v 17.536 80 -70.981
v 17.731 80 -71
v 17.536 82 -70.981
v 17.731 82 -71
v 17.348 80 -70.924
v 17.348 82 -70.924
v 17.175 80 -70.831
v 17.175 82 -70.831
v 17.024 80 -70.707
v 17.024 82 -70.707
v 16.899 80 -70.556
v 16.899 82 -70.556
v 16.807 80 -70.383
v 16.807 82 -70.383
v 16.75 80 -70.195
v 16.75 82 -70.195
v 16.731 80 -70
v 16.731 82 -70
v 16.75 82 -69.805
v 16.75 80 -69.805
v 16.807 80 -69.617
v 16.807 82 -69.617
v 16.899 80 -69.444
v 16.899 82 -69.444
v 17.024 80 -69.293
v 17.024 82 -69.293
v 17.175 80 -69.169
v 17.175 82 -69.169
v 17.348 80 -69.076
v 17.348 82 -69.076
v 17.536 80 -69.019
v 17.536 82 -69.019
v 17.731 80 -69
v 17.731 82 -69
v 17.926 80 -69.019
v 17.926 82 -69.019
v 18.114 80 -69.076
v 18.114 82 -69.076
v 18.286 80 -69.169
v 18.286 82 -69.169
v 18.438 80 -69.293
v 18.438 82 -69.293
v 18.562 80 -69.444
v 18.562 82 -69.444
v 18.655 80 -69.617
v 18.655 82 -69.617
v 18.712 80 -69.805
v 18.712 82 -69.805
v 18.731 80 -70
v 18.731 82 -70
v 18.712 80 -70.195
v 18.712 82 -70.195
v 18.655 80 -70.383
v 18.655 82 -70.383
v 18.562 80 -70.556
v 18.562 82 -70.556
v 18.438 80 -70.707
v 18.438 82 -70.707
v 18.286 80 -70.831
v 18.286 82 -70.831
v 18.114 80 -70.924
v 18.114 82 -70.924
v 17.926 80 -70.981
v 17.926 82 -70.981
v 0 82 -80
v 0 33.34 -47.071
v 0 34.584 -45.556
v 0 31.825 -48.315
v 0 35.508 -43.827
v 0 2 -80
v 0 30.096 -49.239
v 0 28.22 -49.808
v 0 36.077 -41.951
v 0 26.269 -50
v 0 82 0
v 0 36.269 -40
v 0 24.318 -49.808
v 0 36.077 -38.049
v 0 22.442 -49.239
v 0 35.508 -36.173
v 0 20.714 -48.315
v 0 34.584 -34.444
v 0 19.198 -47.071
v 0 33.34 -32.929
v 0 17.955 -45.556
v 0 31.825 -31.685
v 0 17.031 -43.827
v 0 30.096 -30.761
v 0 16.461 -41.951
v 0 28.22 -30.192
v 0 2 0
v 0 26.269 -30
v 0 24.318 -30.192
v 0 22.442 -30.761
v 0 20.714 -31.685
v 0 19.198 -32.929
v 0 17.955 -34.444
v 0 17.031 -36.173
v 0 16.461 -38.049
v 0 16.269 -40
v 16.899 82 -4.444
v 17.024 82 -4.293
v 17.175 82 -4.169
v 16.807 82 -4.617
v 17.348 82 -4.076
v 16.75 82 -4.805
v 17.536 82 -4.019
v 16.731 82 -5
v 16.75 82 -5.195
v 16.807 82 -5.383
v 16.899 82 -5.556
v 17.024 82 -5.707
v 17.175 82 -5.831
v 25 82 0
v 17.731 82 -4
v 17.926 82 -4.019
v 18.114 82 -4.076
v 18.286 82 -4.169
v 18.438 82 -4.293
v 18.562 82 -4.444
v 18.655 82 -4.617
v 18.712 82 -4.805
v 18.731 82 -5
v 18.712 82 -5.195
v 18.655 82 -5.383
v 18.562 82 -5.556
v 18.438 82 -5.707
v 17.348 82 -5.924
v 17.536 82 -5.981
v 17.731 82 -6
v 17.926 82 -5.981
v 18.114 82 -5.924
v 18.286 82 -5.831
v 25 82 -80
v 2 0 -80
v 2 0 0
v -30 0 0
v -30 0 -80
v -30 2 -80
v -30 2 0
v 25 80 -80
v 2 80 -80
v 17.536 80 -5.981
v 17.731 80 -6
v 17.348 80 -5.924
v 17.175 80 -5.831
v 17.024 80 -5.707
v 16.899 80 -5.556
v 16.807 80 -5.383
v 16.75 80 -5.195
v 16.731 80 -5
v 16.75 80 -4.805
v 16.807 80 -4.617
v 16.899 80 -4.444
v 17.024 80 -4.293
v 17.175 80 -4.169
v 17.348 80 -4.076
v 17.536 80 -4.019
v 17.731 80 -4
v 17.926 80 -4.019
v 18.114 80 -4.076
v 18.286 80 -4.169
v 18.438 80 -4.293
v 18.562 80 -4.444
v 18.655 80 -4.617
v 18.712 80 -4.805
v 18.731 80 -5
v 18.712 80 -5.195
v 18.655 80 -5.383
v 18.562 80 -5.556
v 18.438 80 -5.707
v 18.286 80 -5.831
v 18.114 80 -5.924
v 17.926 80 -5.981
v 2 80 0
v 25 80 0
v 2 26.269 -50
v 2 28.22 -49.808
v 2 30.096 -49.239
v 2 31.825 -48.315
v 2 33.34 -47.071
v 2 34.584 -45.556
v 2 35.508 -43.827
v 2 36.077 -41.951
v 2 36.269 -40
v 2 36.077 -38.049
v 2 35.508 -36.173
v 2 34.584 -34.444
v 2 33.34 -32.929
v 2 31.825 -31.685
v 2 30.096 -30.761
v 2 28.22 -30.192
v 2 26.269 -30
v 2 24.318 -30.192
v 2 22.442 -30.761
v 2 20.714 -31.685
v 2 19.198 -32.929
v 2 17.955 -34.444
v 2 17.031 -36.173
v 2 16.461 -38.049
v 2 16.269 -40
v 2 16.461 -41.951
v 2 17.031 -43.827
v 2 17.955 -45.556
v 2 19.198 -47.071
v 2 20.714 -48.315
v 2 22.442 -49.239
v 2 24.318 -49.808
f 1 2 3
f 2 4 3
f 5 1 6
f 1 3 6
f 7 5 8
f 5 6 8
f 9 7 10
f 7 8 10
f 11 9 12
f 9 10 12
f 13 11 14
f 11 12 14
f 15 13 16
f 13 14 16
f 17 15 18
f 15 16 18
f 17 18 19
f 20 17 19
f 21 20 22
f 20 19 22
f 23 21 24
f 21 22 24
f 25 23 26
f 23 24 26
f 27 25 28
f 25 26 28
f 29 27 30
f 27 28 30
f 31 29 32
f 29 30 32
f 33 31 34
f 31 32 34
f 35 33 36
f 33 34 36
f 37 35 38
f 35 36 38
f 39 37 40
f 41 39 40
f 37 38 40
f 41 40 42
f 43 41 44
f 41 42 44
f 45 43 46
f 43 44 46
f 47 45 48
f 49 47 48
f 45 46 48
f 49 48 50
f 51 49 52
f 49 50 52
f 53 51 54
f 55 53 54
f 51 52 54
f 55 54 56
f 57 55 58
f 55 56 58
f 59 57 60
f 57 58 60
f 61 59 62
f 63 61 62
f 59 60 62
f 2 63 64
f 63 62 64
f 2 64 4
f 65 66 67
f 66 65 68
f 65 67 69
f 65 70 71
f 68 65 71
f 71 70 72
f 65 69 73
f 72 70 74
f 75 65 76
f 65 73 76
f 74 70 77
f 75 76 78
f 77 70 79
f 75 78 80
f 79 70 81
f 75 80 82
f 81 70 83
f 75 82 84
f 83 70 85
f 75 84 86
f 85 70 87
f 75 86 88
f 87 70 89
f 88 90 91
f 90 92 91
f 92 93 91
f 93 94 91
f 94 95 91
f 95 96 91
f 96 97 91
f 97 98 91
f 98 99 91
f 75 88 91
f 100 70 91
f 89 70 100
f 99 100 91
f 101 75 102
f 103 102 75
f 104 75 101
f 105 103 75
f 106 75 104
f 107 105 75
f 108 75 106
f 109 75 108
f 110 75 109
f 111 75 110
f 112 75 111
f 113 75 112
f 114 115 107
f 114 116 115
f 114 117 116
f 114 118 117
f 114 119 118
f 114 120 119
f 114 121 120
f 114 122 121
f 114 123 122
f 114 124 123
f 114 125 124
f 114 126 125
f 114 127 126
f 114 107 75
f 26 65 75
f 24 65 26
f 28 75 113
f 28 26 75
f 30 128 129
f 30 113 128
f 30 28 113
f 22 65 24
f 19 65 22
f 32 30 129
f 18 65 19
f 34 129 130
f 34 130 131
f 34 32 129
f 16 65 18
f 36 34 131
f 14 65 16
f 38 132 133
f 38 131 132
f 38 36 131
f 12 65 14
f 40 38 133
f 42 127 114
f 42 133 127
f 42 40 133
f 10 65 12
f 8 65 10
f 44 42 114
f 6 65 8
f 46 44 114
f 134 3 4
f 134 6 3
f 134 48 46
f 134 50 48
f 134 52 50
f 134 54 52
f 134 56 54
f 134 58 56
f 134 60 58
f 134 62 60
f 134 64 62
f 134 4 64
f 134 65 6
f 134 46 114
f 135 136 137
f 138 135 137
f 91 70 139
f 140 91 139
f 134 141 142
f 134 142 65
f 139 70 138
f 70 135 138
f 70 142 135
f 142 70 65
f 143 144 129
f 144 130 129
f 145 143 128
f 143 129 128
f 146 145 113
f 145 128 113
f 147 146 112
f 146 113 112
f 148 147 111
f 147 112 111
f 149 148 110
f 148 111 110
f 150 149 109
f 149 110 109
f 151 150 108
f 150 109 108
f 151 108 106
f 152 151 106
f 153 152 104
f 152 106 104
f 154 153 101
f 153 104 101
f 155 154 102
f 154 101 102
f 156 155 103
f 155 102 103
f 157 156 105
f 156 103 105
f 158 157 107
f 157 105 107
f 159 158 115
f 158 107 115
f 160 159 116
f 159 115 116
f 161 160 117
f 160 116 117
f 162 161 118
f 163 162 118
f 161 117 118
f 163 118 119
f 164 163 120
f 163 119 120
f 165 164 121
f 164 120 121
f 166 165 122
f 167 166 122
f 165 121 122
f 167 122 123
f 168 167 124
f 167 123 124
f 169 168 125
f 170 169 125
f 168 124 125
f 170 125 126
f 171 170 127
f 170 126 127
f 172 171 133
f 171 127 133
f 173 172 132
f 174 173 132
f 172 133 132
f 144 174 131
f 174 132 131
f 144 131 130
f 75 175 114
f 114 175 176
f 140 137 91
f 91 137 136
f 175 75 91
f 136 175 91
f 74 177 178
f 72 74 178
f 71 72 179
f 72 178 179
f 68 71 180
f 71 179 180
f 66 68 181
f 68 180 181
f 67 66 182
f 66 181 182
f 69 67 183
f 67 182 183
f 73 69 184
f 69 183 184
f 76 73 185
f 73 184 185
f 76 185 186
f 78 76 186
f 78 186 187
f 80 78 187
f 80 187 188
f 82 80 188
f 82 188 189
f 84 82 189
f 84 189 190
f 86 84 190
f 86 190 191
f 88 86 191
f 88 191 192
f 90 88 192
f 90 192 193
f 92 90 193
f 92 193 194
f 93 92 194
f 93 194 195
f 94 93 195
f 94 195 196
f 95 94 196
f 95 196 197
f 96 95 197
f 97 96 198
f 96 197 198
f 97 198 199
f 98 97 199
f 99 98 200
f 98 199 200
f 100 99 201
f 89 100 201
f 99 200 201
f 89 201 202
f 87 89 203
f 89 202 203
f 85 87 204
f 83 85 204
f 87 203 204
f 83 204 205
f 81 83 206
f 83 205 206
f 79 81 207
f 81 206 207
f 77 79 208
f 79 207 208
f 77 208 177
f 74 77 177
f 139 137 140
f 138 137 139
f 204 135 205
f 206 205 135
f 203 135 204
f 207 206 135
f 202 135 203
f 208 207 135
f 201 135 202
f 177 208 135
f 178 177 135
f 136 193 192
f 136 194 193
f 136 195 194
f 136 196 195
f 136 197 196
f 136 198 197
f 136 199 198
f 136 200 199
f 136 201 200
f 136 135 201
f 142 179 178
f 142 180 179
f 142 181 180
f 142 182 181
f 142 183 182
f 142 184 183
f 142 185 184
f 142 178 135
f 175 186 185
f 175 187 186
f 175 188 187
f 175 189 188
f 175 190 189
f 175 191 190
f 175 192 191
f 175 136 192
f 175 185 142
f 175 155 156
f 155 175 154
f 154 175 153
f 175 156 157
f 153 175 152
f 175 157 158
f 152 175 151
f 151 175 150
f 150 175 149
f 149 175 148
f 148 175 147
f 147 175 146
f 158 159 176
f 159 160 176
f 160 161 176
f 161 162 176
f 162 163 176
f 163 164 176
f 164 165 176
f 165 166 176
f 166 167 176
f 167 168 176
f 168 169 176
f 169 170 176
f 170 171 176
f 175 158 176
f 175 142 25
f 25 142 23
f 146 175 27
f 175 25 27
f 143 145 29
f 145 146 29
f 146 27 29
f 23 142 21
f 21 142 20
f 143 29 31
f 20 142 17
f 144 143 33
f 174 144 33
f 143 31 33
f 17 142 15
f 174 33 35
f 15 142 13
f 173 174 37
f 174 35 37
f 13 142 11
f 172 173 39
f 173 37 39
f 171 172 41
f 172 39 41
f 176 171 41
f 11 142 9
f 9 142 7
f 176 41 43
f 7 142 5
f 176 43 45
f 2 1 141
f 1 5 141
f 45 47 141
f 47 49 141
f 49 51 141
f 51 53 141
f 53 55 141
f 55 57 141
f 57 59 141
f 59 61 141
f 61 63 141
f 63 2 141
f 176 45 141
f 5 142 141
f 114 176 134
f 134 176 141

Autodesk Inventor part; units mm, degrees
ref_plane "YZ Plane" through (0, 0, 0) normal (1, 0, 0) x (0, 1, 0)
ref_plane "XZ Plane" through (0, 0, 0) normal (0, 1, 0) x (-1, 0, 0)
ref_plane "XY Plane" through (0, 0, 0) normal (0, 0, 1) x (1, 0, 0)
sketch "Sketch1" plane through (0, 0, 0) normal (0, 1, 0) x (-1, 0, 0)
  line L0 (0, 0) -> (30, 0)
  line L1 (30, 0) -> (30, -80)
  line L2 (30, -80) -> (0, -80)
  line L3 (0, -80) -> (0, 0)
  dimension "d0" = 30
  dimension "d1" = 80
extrude "Extrusion1" add sketch "Sketch1" along normal blind 2
sketch "Sketch2" plane through (0, 0, 0) normal (0, 0, 1) x (1, 0, 0)
  point P0 (0, 0)
sketch "Sketch3" plane through (0, 0, 0) normal (1, 0, 0) x (0, 1, 0)
  line L0 (0, 0) -> (80, 0)
  line L1 (80, 0) -> (80, -80)
  line L2 (80, -80) -> (0, -80)
  line L3 (0, -80) -> (0, 0)
  dimension "d4" = 80
  dimension "d11" = 80
extrude "Extrusion2" add sketch "Sketch3" along normal blind 2
sketch "Sketch4" plane through (0, 0, 0) normal (0, 1, 0) x (-1, 0, 0)
  point P0 (0, 0)
sketch "Sketch5" plane through (0, 0, 0) normal (-1, 0, 0) x (0, 0, 1)
  point P0 (0, 0)
sketch "Sketch6" plane through (0, 80, 0) normal (0, 1, 0) x (1, 0, 0)
  line L0 (-30, 0) -> (0, 0) projected
  line L1 (0, 0) -> (25, 0)
  line L2 (25, 0) -> (25, 80)
  line L3 (25, 80) -> (0, 80)
  line L4 (0, 80) -> (0, 0)
  dimension "d7" = 25
  dimension "d8" = 80
extrude "Extrusion3" add sketch "Sketch6" along normal blind 2
sketch "Sketch7" plane through (0, 2, 0) normal (0, 1, 0) x (1, 0, 0)
  point P0 (0, 0)
  point P1 (-20.3201, 56.529)
  point P2 (-18.421, 5.5073)
sketch "Sketch8" plane through (0, 0, 0) normal (0, -1, 0) x (1, 0, 0)
  point P0 (0, 0)
sketch "Sketch9" plane through (0, 80, 0) normal (0, -1, 0) x (1, 0, 0)
  line L0 (2, -80) -> (2, 0) projected
  line L1 (2, 0) -> (25, 0) projected
  line L2 (25, -80) -> (2, -80) projected
  point P0 (0, 0)
  point P1 (2, -65)
  point P2 (2, 0)
  point P3 (17.7309, -70)
  point P4 (2, 0)
  point P5 (17.7309, 0)
  point P6 (17.7309, -70)
  point P7 (17.7309, -5)
  dimension "d12" = 10
hole "Hole1" at (17.7309, 80, -70) at (17.7309, 80, -5) direction (0, 1, 0) diameter 2 depth 25 tip angle 118
sketch "Sketch10" plane through (2, 0, 0) normal (1, 0, 0) x (0, 0, -1)
  circle A0 centre (40, 26.2693) radius 10
  line L0 (80, 0) -> (80, 80) projected
  point P0 (0, 0)
  dimension "d20" = 20
  dimension "d21" = 40
extrude "Extrusion4" cut sketch "Sketch10" against normal blind 2
sketch "Sketch11" plane through (2, 0, 0) normal (1, 0, 0) x (0, 0, -1)
  point P0 (0, 0)
sketch "Sketch12" plane through (0, 0, 0) normal (-1, 0, 0) x (0, 0, 1)
  point P0 (0, 0)
properties part number "dc clamp" material "Lead"
